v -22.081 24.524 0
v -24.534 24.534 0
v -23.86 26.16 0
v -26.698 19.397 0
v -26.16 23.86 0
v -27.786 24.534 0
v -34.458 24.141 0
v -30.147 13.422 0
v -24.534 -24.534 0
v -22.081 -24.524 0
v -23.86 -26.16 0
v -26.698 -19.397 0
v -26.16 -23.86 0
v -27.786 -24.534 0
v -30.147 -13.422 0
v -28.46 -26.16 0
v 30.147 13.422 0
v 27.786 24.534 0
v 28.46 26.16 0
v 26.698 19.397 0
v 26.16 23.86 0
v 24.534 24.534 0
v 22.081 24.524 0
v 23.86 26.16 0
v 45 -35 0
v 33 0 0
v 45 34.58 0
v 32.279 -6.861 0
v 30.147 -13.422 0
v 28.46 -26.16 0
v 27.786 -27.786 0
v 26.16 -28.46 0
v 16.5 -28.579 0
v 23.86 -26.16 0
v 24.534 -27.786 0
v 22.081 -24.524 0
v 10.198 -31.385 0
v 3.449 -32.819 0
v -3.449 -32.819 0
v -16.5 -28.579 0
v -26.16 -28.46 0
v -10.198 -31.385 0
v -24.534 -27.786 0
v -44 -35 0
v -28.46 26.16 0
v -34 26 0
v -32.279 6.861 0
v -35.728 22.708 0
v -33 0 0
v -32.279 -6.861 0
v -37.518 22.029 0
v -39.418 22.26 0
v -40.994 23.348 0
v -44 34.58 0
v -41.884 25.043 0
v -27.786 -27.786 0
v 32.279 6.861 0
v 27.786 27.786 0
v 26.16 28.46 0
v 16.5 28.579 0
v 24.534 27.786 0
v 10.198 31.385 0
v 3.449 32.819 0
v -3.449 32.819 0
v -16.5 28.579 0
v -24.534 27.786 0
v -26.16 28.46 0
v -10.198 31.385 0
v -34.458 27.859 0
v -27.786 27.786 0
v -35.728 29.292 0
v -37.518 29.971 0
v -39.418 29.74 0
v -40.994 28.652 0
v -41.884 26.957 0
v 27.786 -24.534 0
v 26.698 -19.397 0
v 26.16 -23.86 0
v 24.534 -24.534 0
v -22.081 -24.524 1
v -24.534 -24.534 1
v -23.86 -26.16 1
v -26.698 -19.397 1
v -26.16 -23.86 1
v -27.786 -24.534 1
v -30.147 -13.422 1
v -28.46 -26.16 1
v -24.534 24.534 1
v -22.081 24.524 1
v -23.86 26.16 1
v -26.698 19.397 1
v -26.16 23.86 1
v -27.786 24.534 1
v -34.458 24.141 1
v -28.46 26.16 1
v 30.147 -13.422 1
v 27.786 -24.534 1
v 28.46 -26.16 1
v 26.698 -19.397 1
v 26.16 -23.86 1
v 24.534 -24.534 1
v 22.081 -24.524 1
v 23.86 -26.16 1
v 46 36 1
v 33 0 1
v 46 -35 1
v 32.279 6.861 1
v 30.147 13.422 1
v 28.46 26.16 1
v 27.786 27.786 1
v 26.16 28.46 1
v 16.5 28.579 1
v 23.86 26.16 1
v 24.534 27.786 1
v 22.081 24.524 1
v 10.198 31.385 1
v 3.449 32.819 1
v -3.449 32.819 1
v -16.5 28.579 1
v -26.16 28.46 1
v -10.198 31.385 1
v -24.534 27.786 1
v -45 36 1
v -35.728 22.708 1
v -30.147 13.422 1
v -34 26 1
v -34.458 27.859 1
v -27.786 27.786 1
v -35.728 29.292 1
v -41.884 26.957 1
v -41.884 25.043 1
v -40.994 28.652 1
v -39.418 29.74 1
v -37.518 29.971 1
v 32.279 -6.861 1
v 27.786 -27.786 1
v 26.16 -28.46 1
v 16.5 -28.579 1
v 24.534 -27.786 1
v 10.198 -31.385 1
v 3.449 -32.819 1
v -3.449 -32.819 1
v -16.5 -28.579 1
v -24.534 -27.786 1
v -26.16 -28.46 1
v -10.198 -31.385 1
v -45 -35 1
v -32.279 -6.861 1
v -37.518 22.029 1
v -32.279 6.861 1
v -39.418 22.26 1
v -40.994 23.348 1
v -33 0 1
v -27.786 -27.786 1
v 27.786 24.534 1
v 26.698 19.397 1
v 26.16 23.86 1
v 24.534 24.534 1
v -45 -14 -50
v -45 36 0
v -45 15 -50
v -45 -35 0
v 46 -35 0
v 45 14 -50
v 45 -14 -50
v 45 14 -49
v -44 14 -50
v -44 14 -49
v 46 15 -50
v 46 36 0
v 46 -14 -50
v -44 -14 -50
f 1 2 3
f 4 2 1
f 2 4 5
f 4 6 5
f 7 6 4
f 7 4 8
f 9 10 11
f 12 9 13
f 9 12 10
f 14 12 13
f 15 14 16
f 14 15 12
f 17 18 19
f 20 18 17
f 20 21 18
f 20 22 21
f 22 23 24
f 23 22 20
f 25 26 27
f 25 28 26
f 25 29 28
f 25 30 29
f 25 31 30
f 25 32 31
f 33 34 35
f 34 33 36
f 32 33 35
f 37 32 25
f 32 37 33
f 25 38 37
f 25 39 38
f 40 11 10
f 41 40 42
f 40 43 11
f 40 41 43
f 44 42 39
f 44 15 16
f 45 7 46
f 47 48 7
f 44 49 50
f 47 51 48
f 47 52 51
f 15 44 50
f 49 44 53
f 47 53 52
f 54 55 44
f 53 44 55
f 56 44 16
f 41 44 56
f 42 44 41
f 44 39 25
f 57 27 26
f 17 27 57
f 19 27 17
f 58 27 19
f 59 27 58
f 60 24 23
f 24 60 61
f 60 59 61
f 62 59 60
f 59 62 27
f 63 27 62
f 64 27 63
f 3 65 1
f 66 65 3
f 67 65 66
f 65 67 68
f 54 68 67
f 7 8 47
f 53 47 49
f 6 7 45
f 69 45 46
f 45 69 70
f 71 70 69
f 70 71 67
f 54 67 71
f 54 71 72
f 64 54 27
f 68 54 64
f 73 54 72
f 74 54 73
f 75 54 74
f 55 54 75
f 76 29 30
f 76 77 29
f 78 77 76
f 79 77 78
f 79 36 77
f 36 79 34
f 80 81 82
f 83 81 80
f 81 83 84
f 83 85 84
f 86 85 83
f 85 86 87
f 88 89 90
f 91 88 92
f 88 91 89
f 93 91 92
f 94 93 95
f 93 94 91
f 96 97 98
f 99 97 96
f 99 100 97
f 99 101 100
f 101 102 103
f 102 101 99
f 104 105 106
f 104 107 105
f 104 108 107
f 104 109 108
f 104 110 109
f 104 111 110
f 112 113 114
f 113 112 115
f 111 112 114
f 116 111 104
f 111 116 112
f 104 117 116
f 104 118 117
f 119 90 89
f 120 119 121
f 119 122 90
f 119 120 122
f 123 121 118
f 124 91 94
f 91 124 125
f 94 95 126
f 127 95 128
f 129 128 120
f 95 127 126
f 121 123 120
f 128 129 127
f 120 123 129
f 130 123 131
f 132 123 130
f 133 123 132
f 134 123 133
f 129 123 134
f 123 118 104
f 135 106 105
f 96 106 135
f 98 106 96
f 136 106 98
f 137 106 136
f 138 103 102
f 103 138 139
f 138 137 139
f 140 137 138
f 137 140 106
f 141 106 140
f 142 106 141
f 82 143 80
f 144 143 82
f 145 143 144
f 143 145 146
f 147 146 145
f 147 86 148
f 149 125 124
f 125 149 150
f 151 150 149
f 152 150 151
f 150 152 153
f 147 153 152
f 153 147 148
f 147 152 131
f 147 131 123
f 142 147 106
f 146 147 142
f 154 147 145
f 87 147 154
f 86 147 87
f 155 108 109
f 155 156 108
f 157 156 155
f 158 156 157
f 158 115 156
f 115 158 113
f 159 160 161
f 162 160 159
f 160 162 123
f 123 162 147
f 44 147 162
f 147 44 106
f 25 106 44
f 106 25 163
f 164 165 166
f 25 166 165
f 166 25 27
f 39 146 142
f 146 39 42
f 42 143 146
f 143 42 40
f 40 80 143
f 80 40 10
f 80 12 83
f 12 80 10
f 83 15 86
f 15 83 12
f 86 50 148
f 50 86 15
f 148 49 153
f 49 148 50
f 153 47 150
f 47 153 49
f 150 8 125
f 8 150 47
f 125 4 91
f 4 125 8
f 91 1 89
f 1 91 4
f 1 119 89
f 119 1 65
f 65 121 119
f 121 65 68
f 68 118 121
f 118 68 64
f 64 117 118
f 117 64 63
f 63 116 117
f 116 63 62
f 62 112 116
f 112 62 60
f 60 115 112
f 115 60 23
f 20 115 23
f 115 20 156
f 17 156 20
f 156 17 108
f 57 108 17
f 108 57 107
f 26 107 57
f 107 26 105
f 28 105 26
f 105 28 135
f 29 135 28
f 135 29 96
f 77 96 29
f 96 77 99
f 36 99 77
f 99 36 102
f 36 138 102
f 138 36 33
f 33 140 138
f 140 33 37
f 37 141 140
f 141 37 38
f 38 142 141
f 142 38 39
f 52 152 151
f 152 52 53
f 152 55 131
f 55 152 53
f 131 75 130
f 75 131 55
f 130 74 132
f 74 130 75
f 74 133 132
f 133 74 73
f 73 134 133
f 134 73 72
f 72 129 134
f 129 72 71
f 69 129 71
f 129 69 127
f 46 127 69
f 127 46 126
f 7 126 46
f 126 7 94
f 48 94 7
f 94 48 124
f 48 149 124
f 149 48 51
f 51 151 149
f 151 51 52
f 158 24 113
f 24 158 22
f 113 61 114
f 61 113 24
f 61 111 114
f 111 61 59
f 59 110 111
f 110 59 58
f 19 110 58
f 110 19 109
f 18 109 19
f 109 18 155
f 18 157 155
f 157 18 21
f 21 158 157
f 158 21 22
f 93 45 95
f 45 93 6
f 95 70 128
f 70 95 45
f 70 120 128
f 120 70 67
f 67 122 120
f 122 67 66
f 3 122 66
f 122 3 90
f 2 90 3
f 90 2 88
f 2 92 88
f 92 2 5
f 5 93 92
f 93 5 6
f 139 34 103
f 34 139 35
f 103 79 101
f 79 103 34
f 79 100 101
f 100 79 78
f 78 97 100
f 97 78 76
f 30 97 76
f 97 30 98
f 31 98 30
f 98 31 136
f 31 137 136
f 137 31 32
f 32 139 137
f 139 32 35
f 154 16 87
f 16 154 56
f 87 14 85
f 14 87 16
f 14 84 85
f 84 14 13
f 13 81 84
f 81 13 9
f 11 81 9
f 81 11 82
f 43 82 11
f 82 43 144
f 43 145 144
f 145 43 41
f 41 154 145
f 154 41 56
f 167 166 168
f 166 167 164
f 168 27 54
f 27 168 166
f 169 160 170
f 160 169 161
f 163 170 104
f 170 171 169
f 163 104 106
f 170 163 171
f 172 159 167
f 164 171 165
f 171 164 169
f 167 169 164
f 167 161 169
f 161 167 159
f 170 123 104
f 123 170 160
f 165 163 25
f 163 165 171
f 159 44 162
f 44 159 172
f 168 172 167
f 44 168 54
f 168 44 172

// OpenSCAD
linear_extrude(1)
difference() {
    translate([-45,-35]) square([90, 70]);
    circle(33);
    translate([26.16, 26.16]) circle(2.3);
    translate([-26.16, 26.16]) circle(2.3);
    translate([26.16, -26.16]) circle(2.3);
    translate([-26.16, -26.16]) circle(2.3);
    translate([-38, 26]) circle(4);
}

hull() {
    translate([45, 35, 0])  cube(1);
    translate([45, 14, -50]) cube(1);
    translate([-45, 14, -50]) cube(1);
    translate([-45, 35, 0]) cube(1);
}

hull() {
    translate([45, 35, 0])  cube(1);
    translate([45, 14, -50]) cube(1);
    translate([45, -14, -50]) cube(1);
    translate([45, -35, 0]) cube(1);
}

hull() {
    translate([-45, 35, 0])  cube(1);
    translate([-45, 14, -50]) cube(1);
    translate([-45, -14, -50]) cube(1);
    translate([-45, -35, 0]) cube(1);
}
